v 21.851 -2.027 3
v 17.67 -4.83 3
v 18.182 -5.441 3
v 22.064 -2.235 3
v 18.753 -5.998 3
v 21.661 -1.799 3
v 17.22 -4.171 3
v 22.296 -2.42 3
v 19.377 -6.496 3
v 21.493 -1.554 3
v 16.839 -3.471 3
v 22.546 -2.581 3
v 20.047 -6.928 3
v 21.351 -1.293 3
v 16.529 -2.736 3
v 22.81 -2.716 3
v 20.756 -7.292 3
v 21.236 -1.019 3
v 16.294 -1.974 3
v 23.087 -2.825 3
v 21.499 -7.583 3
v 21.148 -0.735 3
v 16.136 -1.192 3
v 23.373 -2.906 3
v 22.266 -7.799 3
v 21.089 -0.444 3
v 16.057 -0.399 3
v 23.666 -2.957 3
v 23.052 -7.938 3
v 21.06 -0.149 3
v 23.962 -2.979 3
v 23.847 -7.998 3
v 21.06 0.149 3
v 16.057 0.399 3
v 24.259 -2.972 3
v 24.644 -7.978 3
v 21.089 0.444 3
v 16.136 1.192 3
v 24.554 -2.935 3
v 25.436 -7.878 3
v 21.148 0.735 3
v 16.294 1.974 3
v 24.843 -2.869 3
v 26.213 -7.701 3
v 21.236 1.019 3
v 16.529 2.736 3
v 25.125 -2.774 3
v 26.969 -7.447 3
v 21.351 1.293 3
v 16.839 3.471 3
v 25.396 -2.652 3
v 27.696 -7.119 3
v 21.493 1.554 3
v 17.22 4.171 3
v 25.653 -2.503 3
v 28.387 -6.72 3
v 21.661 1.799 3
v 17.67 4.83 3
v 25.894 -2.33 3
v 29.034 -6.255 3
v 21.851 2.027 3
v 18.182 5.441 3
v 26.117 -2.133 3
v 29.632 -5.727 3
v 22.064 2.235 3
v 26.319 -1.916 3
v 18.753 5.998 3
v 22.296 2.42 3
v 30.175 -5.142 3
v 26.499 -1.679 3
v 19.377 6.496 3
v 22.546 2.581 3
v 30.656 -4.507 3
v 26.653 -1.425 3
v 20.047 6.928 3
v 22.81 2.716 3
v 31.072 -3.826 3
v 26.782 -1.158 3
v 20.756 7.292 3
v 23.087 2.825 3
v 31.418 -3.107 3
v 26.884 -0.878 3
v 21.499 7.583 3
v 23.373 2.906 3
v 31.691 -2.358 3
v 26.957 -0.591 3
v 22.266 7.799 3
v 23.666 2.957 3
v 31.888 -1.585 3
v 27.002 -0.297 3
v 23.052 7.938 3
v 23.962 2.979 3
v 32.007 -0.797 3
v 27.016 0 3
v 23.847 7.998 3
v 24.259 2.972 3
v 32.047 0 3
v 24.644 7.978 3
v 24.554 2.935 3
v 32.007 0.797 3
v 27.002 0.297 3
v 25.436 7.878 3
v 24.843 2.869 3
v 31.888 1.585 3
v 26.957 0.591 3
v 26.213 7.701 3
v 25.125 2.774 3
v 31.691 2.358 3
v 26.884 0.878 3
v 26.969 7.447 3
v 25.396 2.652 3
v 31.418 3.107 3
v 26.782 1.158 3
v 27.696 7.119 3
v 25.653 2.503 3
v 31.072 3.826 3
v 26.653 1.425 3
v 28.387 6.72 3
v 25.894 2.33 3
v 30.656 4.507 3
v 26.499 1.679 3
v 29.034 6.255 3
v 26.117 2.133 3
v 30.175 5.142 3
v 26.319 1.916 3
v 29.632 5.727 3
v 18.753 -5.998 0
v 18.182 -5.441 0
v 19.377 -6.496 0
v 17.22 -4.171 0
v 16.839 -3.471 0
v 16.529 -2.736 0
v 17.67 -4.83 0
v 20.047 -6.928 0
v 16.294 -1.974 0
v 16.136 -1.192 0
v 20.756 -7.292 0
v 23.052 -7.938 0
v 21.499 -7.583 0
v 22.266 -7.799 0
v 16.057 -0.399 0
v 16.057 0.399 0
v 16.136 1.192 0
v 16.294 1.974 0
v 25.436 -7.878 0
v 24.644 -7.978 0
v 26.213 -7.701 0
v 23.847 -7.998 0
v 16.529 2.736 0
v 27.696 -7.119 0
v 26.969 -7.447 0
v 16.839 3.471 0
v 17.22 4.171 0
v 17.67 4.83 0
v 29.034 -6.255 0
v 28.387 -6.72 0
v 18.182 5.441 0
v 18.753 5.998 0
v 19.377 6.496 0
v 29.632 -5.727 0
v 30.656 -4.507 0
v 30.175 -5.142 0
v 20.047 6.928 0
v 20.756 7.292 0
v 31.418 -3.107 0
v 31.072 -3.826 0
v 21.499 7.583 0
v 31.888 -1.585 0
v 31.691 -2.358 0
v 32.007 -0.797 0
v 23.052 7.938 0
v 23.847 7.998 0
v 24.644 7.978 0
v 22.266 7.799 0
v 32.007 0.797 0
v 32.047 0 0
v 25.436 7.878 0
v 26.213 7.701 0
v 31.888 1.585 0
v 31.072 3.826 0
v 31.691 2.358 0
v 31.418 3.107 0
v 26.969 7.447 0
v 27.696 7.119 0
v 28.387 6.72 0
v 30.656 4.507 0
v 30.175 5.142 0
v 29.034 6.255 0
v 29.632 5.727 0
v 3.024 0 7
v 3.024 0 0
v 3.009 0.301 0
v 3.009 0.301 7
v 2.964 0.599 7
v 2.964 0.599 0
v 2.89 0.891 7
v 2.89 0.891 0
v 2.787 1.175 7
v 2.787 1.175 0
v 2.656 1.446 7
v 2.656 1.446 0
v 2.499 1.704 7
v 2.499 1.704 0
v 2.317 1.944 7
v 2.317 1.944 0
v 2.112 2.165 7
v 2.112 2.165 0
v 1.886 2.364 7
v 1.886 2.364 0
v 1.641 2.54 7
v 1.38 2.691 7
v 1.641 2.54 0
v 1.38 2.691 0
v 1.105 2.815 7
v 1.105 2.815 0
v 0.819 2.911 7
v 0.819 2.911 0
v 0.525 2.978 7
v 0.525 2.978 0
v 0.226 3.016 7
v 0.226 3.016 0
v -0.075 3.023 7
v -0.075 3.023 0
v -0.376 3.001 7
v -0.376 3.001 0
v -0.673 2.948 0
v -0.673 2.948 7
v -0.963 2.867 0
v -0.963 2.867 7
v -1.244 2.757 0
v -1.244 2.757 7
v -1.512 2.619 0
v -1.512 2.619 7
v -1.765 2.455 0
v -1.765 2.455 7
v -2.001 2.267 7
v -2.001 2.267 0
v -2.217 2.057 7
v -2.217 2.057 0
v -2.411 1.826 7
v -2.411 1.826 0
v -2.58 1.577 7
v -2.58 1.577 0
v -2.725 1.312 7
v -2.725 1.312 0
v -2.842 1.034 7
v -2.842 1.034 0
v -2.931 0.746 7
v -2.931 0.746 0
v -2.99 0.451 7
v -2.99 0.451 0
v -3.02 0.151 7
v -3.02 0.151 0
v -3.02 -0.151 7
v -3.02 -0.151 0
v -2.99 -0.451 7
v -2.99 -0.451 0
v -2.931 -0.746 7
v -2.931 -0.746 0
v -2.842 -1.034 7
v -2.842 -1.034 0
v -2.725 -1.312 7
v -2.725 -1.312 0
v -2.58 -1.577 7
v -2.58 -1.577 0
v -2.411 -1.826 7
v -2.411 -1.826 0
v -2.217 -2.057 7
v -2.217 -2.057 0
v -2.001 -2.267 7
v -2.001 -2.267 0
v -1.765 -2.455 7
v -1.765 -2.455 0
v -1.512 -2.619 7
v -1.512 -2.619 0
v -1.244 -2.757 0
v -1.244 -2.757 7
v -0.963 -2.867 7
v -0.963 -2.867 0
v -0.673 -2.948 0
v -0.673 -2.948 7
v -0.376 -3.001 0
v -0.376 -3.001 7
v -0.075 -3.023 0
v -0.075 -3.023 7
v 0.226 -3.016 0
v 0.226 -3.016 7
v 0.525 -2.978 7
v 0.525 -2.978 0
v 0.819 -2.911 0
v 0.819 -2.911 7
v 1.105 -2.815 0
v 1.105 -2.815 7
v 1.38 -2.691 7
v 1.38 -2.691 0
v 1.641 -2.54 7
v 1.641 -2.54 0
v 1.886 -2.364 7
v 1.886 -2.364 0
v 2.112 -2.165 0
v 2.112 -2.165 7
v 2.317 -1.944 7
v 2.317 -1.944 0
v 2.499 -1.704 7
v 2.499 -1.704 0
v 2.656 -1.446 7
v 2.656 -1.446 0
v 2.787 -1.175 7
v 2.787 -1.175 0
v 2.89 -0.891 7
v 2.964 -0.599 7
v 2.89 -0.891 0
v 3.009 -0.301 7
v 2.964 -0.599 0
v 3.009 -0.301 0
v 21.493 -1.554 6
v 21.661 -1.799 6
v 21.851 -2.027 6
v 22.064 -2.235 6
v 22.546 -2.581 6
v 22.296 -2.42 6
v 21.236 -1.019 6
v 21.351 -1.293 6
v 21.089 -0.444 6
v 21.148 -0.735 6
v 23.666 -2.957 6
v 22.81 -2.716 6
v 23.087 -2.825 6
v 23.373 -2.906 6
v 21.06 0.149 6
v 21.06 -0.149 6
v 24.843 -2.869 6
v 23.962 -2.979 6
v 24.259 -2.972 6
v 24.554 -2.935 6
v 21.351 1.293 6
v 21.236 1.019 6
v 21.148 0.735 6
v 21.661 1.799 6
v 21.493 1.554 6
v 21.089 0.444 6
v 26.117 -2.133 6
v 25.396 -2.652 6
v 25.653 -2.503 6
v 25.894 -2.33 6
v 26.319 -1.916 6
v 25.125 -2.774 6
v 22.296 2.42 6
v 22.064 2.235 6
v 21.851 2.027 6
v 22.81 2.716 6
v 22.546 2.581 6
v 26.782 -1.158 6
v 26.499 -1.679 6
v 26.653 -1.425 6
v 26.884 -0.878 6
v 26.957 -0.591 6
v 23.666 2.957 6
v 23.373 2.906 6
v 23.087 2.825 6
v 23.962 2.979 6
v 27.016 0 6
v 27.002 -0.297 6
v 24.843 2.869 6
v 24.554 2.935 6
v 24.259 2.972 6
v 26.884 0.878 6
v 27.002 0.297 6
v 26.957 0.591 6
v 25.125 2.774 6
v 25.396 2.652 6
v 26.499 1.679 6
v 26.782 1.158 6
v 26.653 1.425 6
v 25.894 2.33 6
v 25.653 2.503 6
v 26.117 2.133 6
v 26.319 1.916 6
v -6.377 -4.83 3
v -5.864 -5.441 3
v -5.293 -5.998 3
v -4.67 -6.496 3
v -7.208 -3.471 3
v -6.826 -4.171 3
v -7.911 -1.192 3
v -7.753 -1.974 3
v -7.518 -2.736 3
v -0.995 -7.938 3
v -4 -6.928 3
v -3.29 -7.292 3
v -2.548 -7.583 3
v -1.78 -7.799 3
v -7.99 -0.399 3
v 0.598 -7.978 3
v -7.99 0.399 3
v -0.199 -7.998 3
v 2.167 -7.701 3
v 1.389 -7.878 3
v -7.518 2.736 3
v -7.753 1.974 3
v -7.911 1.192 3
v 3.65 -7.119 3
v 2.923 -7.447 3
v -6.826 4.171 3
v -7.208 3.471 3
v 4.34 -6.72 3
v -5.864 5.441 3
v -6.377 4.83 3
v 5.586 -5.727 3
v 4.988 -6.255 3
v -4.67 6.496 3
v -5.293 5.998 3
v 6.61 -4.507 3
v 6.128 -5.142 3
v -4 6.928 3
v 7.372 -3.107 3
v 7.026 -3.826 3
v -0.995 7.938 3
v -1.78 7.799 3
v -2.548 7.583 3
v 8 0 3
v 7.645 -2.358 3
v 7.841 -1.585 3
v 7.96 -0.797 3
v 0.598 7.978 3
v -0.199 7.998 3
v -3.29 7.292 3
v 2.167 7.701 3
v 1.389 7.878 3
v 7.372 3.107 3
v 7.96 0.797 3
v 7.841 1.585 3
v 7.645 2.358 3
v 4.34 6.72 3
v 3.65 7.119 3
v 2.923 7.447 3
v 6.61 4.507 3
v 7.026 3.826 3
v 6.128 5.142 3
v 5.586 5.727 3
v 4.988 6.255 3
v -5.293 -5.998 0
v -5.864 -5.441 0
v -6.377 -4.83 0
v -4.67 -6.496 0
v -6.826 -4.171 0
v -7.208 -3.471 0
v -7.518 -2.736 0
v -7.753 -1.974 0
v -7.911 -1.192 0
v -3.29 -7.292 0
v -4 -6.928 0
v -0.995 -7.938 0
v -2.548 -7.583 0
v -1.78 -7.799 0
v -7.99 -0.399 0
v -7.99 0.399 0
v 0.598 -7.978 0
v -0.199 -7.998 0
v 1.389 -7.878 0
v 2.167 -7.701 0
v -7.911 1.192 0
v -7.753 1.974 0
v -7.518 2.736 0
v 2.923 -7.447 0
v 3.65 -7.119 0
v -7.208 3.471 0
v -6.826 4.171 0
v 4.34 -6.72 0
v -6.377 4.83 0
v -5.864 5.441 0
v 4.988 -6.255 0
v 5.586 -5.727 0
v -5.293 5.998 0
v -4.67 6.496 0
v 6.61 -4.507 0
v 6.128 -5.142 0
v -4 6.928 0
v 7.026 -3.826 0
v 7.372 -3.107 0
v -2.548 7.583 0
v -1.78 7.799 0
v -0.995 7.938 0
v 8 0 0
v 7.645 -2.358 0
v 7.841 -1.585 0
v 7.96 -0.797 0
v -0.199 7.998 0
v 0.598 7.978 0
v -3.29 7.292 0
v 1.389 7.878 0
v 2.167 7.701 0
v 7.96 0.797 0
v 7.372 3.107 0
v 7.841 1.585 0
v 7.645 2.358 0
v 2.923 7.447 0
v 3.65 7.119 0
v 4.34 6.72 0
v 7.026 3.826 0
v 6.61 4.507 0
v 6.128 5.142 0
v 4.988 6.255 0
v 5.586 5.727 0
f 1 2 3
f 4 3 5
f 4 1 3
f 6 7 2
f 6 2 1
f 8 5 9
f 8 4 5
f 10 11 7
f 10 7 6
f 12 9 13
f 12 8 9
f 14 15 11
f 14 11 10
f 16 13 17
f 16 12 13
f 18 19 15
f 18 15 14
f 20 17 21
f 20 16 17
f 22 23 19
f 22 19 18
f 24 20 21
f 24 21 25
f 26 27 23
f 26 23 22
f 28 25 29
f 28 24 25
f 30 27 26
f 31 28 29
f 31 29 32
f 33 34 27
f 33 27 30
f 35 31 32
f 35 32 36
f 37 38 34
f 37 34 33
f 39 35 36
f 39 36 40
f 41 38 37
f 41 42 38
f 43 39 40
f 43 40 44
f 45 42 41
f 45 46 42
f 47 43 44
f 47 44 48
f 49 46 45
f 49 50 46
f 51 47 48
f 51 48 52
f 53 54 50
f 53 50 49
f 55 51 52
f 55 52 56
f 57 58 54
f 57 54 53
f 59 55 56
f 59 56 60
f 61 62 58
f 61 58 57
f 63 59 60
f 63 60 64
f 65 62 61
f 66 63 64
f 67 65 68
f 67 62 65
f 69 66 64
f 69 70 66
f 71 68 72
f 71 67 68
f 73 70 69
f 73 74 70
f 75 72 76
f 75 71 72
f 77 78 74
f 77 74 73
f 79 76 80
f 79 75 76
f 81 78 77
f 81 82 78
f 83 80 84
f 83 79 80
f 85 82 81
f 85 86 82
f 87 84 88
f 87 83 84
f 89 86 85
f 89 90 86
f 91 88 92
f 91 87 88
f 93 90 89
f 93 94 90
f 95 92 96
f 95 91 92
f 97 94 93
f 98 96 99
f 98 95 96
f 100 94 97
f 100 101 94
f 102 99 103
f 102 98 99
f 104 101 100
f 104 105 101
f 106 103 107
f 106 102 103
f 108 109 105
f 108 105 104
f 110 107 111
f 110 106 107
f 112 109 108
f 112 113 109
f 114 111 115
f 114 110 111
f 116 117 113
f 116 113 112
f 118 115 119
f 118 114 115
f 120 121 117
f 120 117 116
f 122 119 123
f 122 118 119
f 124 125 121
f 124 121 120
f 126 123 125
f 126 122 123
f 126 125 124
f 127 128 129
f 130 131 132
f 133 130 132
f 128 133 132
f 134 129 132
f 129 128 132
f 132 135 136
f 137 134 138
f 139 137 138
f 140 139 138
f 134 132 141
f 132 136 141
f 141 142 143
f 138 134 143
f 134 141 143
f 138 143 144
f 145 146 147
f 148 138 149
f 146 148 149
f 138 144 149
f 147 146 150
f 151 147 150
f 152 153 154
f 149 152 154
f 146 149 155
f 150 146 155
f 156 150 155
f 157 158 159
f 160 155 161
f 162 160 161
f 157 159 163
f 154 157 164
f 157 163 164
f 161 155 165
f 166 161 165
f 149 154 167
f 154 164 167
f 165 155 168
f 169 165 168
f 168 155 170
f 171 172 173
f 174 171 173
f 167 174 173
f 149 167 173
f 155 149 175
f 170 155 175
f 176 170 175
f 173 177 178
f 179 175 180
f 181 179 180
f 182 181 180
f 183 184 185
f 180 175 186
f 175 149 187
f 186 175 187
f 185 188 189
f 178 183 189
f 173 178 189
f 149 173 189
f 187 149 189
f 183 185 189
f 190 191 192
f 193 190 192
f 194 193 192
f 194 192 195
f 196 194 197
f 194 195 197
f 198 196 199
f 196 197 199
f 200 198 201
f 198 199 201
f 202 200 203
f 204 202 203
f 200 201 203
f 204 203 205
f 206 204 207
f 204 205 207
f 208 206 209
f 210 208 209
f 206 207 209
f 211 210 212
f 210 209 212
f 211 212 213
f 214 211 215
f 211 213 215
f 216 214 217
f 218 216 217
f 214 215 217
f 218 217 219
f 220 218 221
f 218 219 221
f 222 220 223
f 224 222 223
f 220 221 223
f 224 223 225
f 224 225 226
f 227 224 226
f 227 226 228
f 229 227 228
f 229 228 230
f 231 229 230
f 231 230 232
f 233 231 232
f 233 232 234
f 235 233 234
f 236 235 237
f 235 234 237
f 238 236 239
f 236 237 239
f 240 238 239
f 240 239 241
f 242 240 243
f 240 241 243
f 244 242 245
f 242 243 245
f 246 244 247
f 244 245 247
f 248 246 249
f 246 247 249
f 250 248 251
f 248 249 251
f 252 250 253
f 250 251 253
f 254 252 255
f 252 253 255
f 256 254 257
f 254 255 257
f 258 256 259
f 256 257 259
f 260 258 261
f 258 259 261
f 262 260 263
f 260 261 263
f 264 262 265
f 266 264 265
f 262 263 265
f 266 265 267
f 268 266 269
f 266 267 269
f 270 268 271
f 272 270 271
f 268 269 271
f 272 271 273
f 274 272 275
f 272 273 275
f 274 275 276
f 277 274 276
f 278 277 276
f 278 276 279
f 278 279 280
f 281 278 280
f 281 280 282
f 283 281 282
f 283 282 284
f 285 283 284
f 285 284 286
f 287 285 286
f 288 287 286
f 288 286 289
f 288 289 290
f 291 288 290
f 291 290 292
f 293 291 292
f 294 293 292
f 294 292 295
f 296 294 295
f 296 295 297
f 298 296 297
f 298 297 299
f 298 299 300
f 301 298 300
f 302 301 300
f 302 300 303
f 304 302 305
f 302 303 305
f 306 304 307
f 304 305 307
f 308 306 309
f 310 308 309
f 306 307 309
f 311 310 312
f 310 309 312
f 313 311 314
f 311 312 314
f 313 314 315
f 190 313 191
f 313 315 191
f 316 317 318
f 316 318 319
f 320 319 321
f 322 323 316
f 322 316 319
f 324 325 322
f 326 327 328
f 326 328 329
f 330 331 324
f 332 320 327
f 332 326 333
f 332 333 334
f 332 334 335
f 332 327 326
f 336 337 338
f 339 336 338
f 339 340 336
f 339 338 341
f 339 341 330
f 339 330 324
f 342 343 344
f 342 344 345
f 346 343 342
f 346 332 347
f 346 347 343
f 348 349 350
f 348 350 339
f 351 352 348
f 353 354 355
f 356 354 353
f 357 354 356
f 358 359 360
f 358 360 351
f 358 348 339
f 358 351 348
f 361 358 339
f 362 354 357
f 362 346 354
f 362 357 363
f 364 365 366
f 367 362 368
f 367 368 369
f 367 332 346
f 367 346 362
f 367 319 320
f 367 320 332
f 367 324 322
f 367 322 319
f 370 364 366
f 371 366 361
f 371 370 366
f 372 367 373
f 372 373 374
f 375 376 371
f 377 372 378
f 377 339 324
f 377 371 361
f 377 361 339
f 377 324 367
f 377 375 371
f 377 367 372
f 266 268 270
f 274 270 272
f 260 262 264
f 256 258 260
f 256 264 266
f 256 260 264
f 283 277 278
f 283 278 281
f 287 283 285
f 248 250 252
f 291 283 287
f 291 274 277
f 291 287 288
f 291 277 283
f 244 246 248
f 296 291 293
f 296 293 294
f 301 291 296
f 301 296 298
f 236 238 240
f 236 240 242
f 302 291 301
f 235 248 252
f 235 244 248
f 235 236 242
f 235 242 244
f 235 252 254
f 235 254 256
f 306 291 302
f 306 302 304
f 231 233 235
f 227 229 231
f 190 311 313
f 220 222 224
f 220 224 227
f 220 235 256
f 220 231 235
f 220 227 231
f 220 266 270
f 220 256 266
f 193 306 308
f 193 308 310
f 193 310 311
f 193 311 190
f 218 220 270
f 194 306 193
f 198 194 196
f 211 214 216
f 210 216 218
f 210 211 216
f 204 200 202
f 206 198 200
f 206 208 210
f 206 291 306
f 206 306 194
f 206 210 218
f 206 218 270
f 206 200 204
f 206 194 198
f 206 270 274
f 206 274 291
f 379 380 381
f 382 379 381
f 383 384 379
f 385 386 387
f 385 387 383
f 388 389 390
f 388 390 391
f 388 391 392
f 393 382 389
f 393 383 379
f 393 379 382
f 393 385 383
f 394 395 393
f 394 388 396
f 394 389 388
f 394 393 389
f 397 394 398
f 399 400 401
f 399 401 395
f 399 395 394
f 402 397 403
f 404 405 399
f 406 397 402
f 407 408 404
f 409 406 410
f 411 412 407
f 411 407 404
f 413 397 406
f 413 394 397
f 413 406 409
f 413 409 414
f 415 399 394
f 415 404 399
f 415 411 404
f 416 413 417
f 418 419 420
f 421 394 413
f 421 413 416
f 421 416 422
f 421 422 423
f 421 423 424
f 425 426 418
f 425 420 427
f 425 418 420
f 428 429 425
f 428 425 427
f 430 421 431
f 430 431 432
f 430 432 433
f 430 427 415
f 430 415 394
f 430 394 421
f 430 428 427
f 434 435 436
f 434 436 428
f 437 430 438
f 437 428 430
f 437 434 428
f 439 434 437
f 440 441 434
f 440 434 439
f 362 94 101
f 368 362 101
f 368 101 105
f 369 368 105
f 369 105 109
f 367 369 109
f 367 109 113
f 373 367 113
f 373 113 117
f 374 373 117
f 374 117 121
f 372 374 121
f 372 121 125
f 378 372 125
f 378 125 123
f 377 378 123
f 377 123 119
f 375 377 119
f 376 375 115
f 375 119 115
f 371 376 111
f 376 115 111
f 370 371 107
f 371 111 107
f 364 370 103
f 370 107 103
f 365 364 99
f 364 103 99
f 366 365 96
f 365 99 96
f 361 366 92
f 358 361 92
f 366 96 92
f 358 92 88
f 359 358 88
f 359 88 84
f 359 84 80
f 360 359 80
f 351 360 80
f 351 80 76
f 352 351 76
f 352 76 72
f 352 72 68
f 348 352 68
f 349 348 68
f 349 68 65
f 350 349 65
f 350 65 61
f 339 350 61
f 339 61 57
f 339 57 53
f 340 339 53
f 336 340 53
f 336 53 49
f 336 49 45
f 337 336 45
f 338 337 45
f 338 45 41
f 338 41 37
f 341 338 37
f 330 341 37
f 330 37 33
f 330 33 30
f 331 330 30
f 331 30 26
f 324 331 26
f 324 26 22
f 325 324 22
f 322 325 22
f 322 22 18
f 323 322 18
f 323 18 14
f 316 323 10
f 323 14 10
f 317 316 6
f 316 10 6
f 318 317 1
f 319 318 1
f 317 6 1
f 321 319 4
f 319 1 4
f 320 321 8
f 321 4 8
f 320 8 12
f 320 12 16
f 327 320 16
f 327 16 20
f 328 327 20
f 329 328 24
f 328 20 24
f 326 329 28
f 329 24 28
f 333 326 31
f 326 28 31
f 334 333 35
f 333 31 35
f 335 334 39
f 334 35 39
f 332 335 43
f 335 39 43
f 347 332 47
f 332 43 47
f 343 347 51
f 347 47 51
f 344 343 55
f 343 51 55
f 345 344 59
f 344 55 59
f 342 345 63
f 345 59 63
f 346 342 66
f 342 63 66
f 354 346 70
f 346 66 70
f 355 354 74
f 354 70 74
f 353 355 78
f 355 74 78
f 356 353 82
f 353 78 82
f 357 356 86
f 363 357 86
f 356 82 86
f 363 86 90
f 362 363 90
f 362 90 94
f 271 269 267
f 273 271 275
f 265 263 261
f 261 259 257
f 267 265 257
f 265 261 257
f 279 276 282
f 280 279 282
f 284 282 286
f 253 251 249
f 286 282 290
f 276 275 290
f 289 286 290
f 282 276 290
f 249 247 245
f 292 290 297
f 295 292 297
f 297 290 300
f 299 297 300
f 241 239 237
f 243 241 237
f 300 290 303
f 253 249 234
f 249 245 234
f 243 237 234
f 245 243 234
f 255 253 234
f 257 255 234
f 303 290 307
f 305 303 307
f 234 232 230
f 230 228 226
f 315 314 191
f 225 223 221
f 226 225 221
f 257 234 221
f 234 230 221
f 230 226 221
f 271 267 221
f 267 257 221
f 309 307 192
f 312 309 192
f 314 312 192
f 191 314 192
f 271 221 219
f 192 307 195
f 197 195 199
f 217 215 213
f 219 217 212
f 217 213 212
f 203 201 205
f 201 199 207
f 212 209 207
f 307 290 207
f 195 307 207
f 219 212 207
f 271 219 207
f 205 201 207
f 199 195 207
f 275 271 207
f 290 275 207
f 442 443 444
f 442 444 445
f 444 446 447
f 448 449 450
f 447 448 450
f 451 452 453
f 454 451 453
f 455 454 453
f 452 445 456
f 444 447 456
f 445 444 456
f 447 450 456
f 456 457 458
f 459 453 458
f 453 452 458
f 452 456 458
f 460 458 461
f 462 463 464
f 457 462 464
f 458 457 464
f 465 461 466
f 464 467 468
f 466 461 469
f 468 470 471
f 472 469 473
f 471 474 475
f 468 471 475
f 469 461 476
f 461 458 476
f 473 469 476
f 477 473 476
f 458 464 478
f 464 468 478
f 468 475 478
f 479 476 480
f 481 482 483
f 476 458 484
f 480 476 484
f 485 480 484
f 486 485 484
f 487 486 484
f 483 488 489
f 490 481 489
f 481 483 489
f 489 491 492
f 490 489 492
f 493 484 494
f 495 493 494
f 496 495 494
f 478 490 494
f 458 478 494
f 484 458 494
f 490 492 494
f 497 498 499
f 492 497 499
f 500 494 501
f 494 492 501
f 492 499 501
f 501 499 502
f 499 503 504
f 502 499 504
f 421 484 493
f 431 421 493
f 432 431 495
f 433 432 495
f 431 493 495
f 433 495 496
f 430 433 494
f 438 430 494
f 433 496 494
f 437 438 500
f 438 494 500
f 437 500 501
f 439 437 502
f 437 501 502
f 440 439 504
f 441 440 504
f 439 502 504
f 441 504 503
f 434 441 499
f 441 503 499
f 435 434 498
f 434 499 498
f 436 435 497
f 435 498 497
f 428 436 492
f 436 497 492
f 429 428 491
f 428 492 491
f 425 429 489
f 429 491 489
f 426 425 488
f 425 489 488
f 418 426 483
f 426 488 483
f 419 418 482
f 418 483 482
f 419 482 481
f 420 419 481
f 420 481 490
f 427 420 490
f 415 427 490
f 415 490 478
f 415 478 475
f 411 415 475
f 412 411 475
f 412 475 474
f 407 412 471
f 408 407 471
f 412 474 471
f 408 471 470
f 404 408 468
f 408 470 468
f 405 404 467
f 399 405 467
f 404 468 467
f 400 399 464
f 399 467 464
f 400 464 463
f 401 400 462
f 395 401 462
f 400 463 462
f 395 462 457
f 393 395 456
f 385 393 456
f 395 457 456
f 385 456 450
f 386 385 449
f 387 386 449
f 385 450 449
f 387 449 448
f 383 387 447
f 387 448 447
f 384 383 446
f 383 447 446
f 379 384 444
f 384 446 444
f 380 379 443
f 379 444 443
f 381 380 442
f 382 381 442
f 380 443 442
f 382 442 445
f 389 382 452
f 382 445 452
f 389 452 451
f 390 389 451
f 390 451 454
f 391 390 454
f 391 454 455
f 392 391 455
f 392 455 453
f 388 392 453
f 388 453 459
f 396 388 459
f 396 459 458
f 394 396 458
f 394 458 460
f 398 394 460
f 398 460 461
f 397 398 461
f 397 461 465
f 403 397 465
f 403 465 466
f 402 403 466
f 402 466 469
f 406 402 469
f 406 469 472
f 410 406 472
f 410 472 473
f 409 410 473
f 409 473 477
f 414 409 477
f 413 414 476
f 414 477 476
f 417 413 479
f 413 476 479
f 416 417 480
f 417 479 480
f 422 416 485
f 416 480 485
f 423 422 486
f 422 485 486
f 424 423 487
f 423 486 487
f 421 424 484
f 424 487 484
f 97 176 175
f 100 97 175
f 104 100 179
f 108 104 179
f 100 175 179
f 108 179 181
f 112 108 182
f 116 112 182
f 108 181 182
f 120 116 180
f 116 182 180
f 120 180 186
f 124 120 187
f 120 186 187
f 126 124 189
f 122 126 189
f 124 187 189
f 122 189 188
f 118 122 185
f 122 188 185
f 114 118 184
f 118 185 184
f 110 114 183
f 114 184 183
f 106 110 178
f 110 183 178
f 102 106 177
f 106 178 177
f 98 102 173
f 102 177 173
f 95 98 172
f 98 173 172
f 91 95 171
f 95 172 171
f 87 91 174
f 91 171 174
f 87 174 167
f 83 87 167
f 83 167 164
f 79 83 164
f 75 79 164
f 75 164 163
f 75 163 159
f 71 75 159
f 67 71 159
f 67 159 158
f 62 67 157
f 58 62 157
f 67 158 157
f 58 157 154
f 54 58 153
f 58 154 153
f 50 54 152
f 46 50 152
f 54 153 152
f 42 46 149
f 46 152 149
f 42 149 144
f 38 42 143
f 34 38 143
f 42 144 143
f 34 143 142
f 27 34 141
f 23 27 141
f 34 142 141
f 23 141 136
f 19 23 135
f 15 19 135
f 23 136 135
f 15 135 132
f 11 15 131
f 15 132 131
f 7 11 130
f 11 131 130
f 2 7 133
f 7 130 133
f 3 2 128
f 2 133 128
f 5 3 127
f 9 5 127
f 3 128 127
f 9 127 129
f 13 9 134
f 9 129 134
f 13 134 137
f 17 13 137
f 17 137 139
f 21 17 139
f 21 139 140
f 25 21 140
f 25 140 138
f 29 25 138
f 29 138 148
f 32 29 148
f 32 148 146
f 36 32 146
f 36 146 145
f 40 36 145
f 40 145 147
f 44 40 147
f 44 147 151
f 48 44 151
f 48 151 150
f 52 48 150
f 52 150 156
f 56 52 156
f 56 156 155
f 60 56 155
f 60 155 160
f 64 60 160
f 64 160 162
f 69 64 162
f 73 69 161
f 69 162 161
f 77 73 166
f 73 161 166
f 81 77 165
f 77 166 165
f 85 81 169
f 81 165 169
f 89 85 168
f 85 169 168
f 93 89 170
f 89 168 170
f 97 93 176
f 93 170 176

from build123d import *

# Parameters (mm, degrees)
F0_R     = 8
F3_DEPTH = 3
F1_R     = 2.980231
F4_DEPTH = 6
F2_R     = 3.02413
F5_DEPTH = 7


with BuildPart() as f3:
    # F0 (on Top) → F3 (new body)
    with BuildSketch(Plane.XY):
        Circle(F0_R)
        with Locations((24.046564, 0)):
            Circle(F0_R)
    extrude(amount=F3_DEPTH)

    # F1 (on Top) → F4 (join)
    with BuildSketch(Plane.XY):
        with Locations((24.036163, 0)):
            Circle(F1_R)
    extrude(amount=F4_DEPTH)


with BuildPart() as f5:
    # F2 (on face) → F5 (new body)
    with BuildSketch(Plane.XY):
        Circle(F2_R)
    extrude(amount=F5_DEPTH)


solid = Compound([f3.part, f5.part])
